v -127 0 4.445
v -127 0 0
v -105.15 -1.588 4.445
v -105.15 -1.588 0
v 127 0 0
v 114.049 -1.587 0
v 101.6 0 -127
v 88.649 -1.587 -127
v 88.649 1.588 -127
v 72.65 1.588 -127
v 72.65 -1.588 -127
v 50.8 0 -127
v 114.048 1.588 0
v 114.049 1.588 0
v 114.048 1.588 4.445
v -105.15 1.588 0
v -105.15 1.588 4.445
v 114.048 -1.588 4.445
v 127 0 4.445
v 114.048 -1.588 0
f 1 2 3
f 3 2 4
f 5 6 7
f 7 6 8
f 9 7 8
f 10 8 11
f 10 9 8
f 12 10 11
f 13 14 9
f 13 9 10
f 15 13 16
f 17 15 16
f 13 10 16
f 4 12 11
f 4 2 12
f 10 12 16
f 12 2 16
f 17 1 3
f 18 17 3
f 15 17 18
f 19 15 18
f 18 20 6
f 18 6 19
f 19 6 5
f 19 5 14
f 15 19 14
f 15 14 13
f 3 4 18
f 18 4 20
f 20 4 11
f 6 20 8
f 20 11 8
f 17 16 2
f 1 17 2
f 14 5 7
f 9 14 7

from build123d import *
from OCP.BRepFilletAPI import BRepFilletAPI_MakeChamfer

# Parameters (mm, degrees)
BOSS_EXTRUDE1_DEPTH = 1.5875
CHAMFER1_SIZE       = 1.5875
CHAMFER1_SIZE_2     = 12.7
CHAMFER2_SIZE       = 12.7
CHAMFER2_SIZE_2     = 1.5875
BOSS_EXTRUDE3_DEPTH = 4.445


# Some blends are built 0.0001 mm under size
with BuildPart() as part:
    # Sketch1 → Boss-Extrude1 (new, symmetric)
    with BuildSketch(Plane(origin=(0, 0, 0), x_dir=(1, 0, 0), z_dir=(0, 1, 0))):
        Polygon((-127, 0), (127, 0), (101.6, 127), (50.8, 127), align=None)
    extrude(amount=BOSS_EXTRUDE1_DEPTH, both=True)

    # Chamfer1
    # the kernel refuses this chamfer: 12.7, 1.5875 mm, written as the material it takes off along each edge
    with BuildSketch(Plane(origin=(77.661804698, 1.5875, -146.187003355), x_dir=(-0.1697730315694904, -0.9563912737708591, -0.2376822441972865), z_dir=(-0.8137334712067349, 0, 0.5812381937190965))) as chamfer1_piece_1:
        Polygon((CHAMFER1_SIZE * 0.956391273771, CHAMFER1_SIZE * 0.292088567827), (-CHAMFER1_SIZE_2 * 0.292088567827, CHAMFER1_SIZE_2 * 0.956391273771), (0, 0), align=None)
    extrude(amount=284.520199288, mode=Mode.SUBTRACT)
    with BuildSketch(Plane(origin=(77.661804698, -1.5875, -146.187003355), x_dir=(-0.1697730315694904, 0.9563912737708591, -0.2376822441972865), z_dir=(-0.8137334712067349, 0, 0.5812381937190965))) as chamfer1_piece_2:
        Polygon((CHAMFER1_SIZE * 0.956391273771, -CHAMFER1_SIZE * 0.292088567827), (-CHAMFER1_SIZE_2 * 0.292088567827, -CHAMFER1_SIZE_2 * 0.956391273771), (0, 0), align=None)
    extrude(amount=284.520199288, mode=Mode.SUBTRACT)

    # Chamfer2
    chamfer2_edges_1 = [part.edges().sort_by_distance(p)[0] for p in [
        (114.3, 1.5875, -63.5),
    ]]
    chamfer2_side_1 = [part.faces().sort_by_distance(p)[0] for p in [
        (114.268866564, 1.5875, -63.493773313),
    ]]
    chamfer2_edges_2 = [part.edges().sort_by_distance(p)[0] for p in [
        (114.3, -1.5875, -63.5),
    ]]
    chamfer2_side_2 = [part.faces().sort_by_distance(p)[0] for p in [
        (114.3, -1.55575, -63.5),
    ]]
    chamfer2 = BRepFilletAPI_MakeChamfer(part.part.solid().wrapped)
    for e in chamfer2_edges_1:
        chamfer2.Add(CHAMFER2_SIZE - 0.0001, CHAMFER2_SIZE_2 - 0.0001, e.wrapped, chamfer2_side_1[0].wrapped)
    for e in chamfer2_edges_2:
        chamfer2.Add(CHAMFER2_SIZE_2 - 0.0001, CHAMFER2_SIZE - 0.0001, e.wrapped, chamfer2_side_2[0].wrapped)
    add(Compound.cast(chamfer2.Shape()), mode=Mode.REPLACE)  # a hair under: the kernel refuses the full size

    # Sketch2 → Boss-Extrude3 (add)
    with BuildSketch(Plane.XY):
        Polygon((114.048490435, -1.5875), (127, 0), (114.048490435, 1.5875), (-105.150093822, 1.5875), (-127, 0), (-105.150093822, -1.5875), align=None)
    extrude(amount=BOSS_EXTRUDE3_DEPTH)


solid = part.part
